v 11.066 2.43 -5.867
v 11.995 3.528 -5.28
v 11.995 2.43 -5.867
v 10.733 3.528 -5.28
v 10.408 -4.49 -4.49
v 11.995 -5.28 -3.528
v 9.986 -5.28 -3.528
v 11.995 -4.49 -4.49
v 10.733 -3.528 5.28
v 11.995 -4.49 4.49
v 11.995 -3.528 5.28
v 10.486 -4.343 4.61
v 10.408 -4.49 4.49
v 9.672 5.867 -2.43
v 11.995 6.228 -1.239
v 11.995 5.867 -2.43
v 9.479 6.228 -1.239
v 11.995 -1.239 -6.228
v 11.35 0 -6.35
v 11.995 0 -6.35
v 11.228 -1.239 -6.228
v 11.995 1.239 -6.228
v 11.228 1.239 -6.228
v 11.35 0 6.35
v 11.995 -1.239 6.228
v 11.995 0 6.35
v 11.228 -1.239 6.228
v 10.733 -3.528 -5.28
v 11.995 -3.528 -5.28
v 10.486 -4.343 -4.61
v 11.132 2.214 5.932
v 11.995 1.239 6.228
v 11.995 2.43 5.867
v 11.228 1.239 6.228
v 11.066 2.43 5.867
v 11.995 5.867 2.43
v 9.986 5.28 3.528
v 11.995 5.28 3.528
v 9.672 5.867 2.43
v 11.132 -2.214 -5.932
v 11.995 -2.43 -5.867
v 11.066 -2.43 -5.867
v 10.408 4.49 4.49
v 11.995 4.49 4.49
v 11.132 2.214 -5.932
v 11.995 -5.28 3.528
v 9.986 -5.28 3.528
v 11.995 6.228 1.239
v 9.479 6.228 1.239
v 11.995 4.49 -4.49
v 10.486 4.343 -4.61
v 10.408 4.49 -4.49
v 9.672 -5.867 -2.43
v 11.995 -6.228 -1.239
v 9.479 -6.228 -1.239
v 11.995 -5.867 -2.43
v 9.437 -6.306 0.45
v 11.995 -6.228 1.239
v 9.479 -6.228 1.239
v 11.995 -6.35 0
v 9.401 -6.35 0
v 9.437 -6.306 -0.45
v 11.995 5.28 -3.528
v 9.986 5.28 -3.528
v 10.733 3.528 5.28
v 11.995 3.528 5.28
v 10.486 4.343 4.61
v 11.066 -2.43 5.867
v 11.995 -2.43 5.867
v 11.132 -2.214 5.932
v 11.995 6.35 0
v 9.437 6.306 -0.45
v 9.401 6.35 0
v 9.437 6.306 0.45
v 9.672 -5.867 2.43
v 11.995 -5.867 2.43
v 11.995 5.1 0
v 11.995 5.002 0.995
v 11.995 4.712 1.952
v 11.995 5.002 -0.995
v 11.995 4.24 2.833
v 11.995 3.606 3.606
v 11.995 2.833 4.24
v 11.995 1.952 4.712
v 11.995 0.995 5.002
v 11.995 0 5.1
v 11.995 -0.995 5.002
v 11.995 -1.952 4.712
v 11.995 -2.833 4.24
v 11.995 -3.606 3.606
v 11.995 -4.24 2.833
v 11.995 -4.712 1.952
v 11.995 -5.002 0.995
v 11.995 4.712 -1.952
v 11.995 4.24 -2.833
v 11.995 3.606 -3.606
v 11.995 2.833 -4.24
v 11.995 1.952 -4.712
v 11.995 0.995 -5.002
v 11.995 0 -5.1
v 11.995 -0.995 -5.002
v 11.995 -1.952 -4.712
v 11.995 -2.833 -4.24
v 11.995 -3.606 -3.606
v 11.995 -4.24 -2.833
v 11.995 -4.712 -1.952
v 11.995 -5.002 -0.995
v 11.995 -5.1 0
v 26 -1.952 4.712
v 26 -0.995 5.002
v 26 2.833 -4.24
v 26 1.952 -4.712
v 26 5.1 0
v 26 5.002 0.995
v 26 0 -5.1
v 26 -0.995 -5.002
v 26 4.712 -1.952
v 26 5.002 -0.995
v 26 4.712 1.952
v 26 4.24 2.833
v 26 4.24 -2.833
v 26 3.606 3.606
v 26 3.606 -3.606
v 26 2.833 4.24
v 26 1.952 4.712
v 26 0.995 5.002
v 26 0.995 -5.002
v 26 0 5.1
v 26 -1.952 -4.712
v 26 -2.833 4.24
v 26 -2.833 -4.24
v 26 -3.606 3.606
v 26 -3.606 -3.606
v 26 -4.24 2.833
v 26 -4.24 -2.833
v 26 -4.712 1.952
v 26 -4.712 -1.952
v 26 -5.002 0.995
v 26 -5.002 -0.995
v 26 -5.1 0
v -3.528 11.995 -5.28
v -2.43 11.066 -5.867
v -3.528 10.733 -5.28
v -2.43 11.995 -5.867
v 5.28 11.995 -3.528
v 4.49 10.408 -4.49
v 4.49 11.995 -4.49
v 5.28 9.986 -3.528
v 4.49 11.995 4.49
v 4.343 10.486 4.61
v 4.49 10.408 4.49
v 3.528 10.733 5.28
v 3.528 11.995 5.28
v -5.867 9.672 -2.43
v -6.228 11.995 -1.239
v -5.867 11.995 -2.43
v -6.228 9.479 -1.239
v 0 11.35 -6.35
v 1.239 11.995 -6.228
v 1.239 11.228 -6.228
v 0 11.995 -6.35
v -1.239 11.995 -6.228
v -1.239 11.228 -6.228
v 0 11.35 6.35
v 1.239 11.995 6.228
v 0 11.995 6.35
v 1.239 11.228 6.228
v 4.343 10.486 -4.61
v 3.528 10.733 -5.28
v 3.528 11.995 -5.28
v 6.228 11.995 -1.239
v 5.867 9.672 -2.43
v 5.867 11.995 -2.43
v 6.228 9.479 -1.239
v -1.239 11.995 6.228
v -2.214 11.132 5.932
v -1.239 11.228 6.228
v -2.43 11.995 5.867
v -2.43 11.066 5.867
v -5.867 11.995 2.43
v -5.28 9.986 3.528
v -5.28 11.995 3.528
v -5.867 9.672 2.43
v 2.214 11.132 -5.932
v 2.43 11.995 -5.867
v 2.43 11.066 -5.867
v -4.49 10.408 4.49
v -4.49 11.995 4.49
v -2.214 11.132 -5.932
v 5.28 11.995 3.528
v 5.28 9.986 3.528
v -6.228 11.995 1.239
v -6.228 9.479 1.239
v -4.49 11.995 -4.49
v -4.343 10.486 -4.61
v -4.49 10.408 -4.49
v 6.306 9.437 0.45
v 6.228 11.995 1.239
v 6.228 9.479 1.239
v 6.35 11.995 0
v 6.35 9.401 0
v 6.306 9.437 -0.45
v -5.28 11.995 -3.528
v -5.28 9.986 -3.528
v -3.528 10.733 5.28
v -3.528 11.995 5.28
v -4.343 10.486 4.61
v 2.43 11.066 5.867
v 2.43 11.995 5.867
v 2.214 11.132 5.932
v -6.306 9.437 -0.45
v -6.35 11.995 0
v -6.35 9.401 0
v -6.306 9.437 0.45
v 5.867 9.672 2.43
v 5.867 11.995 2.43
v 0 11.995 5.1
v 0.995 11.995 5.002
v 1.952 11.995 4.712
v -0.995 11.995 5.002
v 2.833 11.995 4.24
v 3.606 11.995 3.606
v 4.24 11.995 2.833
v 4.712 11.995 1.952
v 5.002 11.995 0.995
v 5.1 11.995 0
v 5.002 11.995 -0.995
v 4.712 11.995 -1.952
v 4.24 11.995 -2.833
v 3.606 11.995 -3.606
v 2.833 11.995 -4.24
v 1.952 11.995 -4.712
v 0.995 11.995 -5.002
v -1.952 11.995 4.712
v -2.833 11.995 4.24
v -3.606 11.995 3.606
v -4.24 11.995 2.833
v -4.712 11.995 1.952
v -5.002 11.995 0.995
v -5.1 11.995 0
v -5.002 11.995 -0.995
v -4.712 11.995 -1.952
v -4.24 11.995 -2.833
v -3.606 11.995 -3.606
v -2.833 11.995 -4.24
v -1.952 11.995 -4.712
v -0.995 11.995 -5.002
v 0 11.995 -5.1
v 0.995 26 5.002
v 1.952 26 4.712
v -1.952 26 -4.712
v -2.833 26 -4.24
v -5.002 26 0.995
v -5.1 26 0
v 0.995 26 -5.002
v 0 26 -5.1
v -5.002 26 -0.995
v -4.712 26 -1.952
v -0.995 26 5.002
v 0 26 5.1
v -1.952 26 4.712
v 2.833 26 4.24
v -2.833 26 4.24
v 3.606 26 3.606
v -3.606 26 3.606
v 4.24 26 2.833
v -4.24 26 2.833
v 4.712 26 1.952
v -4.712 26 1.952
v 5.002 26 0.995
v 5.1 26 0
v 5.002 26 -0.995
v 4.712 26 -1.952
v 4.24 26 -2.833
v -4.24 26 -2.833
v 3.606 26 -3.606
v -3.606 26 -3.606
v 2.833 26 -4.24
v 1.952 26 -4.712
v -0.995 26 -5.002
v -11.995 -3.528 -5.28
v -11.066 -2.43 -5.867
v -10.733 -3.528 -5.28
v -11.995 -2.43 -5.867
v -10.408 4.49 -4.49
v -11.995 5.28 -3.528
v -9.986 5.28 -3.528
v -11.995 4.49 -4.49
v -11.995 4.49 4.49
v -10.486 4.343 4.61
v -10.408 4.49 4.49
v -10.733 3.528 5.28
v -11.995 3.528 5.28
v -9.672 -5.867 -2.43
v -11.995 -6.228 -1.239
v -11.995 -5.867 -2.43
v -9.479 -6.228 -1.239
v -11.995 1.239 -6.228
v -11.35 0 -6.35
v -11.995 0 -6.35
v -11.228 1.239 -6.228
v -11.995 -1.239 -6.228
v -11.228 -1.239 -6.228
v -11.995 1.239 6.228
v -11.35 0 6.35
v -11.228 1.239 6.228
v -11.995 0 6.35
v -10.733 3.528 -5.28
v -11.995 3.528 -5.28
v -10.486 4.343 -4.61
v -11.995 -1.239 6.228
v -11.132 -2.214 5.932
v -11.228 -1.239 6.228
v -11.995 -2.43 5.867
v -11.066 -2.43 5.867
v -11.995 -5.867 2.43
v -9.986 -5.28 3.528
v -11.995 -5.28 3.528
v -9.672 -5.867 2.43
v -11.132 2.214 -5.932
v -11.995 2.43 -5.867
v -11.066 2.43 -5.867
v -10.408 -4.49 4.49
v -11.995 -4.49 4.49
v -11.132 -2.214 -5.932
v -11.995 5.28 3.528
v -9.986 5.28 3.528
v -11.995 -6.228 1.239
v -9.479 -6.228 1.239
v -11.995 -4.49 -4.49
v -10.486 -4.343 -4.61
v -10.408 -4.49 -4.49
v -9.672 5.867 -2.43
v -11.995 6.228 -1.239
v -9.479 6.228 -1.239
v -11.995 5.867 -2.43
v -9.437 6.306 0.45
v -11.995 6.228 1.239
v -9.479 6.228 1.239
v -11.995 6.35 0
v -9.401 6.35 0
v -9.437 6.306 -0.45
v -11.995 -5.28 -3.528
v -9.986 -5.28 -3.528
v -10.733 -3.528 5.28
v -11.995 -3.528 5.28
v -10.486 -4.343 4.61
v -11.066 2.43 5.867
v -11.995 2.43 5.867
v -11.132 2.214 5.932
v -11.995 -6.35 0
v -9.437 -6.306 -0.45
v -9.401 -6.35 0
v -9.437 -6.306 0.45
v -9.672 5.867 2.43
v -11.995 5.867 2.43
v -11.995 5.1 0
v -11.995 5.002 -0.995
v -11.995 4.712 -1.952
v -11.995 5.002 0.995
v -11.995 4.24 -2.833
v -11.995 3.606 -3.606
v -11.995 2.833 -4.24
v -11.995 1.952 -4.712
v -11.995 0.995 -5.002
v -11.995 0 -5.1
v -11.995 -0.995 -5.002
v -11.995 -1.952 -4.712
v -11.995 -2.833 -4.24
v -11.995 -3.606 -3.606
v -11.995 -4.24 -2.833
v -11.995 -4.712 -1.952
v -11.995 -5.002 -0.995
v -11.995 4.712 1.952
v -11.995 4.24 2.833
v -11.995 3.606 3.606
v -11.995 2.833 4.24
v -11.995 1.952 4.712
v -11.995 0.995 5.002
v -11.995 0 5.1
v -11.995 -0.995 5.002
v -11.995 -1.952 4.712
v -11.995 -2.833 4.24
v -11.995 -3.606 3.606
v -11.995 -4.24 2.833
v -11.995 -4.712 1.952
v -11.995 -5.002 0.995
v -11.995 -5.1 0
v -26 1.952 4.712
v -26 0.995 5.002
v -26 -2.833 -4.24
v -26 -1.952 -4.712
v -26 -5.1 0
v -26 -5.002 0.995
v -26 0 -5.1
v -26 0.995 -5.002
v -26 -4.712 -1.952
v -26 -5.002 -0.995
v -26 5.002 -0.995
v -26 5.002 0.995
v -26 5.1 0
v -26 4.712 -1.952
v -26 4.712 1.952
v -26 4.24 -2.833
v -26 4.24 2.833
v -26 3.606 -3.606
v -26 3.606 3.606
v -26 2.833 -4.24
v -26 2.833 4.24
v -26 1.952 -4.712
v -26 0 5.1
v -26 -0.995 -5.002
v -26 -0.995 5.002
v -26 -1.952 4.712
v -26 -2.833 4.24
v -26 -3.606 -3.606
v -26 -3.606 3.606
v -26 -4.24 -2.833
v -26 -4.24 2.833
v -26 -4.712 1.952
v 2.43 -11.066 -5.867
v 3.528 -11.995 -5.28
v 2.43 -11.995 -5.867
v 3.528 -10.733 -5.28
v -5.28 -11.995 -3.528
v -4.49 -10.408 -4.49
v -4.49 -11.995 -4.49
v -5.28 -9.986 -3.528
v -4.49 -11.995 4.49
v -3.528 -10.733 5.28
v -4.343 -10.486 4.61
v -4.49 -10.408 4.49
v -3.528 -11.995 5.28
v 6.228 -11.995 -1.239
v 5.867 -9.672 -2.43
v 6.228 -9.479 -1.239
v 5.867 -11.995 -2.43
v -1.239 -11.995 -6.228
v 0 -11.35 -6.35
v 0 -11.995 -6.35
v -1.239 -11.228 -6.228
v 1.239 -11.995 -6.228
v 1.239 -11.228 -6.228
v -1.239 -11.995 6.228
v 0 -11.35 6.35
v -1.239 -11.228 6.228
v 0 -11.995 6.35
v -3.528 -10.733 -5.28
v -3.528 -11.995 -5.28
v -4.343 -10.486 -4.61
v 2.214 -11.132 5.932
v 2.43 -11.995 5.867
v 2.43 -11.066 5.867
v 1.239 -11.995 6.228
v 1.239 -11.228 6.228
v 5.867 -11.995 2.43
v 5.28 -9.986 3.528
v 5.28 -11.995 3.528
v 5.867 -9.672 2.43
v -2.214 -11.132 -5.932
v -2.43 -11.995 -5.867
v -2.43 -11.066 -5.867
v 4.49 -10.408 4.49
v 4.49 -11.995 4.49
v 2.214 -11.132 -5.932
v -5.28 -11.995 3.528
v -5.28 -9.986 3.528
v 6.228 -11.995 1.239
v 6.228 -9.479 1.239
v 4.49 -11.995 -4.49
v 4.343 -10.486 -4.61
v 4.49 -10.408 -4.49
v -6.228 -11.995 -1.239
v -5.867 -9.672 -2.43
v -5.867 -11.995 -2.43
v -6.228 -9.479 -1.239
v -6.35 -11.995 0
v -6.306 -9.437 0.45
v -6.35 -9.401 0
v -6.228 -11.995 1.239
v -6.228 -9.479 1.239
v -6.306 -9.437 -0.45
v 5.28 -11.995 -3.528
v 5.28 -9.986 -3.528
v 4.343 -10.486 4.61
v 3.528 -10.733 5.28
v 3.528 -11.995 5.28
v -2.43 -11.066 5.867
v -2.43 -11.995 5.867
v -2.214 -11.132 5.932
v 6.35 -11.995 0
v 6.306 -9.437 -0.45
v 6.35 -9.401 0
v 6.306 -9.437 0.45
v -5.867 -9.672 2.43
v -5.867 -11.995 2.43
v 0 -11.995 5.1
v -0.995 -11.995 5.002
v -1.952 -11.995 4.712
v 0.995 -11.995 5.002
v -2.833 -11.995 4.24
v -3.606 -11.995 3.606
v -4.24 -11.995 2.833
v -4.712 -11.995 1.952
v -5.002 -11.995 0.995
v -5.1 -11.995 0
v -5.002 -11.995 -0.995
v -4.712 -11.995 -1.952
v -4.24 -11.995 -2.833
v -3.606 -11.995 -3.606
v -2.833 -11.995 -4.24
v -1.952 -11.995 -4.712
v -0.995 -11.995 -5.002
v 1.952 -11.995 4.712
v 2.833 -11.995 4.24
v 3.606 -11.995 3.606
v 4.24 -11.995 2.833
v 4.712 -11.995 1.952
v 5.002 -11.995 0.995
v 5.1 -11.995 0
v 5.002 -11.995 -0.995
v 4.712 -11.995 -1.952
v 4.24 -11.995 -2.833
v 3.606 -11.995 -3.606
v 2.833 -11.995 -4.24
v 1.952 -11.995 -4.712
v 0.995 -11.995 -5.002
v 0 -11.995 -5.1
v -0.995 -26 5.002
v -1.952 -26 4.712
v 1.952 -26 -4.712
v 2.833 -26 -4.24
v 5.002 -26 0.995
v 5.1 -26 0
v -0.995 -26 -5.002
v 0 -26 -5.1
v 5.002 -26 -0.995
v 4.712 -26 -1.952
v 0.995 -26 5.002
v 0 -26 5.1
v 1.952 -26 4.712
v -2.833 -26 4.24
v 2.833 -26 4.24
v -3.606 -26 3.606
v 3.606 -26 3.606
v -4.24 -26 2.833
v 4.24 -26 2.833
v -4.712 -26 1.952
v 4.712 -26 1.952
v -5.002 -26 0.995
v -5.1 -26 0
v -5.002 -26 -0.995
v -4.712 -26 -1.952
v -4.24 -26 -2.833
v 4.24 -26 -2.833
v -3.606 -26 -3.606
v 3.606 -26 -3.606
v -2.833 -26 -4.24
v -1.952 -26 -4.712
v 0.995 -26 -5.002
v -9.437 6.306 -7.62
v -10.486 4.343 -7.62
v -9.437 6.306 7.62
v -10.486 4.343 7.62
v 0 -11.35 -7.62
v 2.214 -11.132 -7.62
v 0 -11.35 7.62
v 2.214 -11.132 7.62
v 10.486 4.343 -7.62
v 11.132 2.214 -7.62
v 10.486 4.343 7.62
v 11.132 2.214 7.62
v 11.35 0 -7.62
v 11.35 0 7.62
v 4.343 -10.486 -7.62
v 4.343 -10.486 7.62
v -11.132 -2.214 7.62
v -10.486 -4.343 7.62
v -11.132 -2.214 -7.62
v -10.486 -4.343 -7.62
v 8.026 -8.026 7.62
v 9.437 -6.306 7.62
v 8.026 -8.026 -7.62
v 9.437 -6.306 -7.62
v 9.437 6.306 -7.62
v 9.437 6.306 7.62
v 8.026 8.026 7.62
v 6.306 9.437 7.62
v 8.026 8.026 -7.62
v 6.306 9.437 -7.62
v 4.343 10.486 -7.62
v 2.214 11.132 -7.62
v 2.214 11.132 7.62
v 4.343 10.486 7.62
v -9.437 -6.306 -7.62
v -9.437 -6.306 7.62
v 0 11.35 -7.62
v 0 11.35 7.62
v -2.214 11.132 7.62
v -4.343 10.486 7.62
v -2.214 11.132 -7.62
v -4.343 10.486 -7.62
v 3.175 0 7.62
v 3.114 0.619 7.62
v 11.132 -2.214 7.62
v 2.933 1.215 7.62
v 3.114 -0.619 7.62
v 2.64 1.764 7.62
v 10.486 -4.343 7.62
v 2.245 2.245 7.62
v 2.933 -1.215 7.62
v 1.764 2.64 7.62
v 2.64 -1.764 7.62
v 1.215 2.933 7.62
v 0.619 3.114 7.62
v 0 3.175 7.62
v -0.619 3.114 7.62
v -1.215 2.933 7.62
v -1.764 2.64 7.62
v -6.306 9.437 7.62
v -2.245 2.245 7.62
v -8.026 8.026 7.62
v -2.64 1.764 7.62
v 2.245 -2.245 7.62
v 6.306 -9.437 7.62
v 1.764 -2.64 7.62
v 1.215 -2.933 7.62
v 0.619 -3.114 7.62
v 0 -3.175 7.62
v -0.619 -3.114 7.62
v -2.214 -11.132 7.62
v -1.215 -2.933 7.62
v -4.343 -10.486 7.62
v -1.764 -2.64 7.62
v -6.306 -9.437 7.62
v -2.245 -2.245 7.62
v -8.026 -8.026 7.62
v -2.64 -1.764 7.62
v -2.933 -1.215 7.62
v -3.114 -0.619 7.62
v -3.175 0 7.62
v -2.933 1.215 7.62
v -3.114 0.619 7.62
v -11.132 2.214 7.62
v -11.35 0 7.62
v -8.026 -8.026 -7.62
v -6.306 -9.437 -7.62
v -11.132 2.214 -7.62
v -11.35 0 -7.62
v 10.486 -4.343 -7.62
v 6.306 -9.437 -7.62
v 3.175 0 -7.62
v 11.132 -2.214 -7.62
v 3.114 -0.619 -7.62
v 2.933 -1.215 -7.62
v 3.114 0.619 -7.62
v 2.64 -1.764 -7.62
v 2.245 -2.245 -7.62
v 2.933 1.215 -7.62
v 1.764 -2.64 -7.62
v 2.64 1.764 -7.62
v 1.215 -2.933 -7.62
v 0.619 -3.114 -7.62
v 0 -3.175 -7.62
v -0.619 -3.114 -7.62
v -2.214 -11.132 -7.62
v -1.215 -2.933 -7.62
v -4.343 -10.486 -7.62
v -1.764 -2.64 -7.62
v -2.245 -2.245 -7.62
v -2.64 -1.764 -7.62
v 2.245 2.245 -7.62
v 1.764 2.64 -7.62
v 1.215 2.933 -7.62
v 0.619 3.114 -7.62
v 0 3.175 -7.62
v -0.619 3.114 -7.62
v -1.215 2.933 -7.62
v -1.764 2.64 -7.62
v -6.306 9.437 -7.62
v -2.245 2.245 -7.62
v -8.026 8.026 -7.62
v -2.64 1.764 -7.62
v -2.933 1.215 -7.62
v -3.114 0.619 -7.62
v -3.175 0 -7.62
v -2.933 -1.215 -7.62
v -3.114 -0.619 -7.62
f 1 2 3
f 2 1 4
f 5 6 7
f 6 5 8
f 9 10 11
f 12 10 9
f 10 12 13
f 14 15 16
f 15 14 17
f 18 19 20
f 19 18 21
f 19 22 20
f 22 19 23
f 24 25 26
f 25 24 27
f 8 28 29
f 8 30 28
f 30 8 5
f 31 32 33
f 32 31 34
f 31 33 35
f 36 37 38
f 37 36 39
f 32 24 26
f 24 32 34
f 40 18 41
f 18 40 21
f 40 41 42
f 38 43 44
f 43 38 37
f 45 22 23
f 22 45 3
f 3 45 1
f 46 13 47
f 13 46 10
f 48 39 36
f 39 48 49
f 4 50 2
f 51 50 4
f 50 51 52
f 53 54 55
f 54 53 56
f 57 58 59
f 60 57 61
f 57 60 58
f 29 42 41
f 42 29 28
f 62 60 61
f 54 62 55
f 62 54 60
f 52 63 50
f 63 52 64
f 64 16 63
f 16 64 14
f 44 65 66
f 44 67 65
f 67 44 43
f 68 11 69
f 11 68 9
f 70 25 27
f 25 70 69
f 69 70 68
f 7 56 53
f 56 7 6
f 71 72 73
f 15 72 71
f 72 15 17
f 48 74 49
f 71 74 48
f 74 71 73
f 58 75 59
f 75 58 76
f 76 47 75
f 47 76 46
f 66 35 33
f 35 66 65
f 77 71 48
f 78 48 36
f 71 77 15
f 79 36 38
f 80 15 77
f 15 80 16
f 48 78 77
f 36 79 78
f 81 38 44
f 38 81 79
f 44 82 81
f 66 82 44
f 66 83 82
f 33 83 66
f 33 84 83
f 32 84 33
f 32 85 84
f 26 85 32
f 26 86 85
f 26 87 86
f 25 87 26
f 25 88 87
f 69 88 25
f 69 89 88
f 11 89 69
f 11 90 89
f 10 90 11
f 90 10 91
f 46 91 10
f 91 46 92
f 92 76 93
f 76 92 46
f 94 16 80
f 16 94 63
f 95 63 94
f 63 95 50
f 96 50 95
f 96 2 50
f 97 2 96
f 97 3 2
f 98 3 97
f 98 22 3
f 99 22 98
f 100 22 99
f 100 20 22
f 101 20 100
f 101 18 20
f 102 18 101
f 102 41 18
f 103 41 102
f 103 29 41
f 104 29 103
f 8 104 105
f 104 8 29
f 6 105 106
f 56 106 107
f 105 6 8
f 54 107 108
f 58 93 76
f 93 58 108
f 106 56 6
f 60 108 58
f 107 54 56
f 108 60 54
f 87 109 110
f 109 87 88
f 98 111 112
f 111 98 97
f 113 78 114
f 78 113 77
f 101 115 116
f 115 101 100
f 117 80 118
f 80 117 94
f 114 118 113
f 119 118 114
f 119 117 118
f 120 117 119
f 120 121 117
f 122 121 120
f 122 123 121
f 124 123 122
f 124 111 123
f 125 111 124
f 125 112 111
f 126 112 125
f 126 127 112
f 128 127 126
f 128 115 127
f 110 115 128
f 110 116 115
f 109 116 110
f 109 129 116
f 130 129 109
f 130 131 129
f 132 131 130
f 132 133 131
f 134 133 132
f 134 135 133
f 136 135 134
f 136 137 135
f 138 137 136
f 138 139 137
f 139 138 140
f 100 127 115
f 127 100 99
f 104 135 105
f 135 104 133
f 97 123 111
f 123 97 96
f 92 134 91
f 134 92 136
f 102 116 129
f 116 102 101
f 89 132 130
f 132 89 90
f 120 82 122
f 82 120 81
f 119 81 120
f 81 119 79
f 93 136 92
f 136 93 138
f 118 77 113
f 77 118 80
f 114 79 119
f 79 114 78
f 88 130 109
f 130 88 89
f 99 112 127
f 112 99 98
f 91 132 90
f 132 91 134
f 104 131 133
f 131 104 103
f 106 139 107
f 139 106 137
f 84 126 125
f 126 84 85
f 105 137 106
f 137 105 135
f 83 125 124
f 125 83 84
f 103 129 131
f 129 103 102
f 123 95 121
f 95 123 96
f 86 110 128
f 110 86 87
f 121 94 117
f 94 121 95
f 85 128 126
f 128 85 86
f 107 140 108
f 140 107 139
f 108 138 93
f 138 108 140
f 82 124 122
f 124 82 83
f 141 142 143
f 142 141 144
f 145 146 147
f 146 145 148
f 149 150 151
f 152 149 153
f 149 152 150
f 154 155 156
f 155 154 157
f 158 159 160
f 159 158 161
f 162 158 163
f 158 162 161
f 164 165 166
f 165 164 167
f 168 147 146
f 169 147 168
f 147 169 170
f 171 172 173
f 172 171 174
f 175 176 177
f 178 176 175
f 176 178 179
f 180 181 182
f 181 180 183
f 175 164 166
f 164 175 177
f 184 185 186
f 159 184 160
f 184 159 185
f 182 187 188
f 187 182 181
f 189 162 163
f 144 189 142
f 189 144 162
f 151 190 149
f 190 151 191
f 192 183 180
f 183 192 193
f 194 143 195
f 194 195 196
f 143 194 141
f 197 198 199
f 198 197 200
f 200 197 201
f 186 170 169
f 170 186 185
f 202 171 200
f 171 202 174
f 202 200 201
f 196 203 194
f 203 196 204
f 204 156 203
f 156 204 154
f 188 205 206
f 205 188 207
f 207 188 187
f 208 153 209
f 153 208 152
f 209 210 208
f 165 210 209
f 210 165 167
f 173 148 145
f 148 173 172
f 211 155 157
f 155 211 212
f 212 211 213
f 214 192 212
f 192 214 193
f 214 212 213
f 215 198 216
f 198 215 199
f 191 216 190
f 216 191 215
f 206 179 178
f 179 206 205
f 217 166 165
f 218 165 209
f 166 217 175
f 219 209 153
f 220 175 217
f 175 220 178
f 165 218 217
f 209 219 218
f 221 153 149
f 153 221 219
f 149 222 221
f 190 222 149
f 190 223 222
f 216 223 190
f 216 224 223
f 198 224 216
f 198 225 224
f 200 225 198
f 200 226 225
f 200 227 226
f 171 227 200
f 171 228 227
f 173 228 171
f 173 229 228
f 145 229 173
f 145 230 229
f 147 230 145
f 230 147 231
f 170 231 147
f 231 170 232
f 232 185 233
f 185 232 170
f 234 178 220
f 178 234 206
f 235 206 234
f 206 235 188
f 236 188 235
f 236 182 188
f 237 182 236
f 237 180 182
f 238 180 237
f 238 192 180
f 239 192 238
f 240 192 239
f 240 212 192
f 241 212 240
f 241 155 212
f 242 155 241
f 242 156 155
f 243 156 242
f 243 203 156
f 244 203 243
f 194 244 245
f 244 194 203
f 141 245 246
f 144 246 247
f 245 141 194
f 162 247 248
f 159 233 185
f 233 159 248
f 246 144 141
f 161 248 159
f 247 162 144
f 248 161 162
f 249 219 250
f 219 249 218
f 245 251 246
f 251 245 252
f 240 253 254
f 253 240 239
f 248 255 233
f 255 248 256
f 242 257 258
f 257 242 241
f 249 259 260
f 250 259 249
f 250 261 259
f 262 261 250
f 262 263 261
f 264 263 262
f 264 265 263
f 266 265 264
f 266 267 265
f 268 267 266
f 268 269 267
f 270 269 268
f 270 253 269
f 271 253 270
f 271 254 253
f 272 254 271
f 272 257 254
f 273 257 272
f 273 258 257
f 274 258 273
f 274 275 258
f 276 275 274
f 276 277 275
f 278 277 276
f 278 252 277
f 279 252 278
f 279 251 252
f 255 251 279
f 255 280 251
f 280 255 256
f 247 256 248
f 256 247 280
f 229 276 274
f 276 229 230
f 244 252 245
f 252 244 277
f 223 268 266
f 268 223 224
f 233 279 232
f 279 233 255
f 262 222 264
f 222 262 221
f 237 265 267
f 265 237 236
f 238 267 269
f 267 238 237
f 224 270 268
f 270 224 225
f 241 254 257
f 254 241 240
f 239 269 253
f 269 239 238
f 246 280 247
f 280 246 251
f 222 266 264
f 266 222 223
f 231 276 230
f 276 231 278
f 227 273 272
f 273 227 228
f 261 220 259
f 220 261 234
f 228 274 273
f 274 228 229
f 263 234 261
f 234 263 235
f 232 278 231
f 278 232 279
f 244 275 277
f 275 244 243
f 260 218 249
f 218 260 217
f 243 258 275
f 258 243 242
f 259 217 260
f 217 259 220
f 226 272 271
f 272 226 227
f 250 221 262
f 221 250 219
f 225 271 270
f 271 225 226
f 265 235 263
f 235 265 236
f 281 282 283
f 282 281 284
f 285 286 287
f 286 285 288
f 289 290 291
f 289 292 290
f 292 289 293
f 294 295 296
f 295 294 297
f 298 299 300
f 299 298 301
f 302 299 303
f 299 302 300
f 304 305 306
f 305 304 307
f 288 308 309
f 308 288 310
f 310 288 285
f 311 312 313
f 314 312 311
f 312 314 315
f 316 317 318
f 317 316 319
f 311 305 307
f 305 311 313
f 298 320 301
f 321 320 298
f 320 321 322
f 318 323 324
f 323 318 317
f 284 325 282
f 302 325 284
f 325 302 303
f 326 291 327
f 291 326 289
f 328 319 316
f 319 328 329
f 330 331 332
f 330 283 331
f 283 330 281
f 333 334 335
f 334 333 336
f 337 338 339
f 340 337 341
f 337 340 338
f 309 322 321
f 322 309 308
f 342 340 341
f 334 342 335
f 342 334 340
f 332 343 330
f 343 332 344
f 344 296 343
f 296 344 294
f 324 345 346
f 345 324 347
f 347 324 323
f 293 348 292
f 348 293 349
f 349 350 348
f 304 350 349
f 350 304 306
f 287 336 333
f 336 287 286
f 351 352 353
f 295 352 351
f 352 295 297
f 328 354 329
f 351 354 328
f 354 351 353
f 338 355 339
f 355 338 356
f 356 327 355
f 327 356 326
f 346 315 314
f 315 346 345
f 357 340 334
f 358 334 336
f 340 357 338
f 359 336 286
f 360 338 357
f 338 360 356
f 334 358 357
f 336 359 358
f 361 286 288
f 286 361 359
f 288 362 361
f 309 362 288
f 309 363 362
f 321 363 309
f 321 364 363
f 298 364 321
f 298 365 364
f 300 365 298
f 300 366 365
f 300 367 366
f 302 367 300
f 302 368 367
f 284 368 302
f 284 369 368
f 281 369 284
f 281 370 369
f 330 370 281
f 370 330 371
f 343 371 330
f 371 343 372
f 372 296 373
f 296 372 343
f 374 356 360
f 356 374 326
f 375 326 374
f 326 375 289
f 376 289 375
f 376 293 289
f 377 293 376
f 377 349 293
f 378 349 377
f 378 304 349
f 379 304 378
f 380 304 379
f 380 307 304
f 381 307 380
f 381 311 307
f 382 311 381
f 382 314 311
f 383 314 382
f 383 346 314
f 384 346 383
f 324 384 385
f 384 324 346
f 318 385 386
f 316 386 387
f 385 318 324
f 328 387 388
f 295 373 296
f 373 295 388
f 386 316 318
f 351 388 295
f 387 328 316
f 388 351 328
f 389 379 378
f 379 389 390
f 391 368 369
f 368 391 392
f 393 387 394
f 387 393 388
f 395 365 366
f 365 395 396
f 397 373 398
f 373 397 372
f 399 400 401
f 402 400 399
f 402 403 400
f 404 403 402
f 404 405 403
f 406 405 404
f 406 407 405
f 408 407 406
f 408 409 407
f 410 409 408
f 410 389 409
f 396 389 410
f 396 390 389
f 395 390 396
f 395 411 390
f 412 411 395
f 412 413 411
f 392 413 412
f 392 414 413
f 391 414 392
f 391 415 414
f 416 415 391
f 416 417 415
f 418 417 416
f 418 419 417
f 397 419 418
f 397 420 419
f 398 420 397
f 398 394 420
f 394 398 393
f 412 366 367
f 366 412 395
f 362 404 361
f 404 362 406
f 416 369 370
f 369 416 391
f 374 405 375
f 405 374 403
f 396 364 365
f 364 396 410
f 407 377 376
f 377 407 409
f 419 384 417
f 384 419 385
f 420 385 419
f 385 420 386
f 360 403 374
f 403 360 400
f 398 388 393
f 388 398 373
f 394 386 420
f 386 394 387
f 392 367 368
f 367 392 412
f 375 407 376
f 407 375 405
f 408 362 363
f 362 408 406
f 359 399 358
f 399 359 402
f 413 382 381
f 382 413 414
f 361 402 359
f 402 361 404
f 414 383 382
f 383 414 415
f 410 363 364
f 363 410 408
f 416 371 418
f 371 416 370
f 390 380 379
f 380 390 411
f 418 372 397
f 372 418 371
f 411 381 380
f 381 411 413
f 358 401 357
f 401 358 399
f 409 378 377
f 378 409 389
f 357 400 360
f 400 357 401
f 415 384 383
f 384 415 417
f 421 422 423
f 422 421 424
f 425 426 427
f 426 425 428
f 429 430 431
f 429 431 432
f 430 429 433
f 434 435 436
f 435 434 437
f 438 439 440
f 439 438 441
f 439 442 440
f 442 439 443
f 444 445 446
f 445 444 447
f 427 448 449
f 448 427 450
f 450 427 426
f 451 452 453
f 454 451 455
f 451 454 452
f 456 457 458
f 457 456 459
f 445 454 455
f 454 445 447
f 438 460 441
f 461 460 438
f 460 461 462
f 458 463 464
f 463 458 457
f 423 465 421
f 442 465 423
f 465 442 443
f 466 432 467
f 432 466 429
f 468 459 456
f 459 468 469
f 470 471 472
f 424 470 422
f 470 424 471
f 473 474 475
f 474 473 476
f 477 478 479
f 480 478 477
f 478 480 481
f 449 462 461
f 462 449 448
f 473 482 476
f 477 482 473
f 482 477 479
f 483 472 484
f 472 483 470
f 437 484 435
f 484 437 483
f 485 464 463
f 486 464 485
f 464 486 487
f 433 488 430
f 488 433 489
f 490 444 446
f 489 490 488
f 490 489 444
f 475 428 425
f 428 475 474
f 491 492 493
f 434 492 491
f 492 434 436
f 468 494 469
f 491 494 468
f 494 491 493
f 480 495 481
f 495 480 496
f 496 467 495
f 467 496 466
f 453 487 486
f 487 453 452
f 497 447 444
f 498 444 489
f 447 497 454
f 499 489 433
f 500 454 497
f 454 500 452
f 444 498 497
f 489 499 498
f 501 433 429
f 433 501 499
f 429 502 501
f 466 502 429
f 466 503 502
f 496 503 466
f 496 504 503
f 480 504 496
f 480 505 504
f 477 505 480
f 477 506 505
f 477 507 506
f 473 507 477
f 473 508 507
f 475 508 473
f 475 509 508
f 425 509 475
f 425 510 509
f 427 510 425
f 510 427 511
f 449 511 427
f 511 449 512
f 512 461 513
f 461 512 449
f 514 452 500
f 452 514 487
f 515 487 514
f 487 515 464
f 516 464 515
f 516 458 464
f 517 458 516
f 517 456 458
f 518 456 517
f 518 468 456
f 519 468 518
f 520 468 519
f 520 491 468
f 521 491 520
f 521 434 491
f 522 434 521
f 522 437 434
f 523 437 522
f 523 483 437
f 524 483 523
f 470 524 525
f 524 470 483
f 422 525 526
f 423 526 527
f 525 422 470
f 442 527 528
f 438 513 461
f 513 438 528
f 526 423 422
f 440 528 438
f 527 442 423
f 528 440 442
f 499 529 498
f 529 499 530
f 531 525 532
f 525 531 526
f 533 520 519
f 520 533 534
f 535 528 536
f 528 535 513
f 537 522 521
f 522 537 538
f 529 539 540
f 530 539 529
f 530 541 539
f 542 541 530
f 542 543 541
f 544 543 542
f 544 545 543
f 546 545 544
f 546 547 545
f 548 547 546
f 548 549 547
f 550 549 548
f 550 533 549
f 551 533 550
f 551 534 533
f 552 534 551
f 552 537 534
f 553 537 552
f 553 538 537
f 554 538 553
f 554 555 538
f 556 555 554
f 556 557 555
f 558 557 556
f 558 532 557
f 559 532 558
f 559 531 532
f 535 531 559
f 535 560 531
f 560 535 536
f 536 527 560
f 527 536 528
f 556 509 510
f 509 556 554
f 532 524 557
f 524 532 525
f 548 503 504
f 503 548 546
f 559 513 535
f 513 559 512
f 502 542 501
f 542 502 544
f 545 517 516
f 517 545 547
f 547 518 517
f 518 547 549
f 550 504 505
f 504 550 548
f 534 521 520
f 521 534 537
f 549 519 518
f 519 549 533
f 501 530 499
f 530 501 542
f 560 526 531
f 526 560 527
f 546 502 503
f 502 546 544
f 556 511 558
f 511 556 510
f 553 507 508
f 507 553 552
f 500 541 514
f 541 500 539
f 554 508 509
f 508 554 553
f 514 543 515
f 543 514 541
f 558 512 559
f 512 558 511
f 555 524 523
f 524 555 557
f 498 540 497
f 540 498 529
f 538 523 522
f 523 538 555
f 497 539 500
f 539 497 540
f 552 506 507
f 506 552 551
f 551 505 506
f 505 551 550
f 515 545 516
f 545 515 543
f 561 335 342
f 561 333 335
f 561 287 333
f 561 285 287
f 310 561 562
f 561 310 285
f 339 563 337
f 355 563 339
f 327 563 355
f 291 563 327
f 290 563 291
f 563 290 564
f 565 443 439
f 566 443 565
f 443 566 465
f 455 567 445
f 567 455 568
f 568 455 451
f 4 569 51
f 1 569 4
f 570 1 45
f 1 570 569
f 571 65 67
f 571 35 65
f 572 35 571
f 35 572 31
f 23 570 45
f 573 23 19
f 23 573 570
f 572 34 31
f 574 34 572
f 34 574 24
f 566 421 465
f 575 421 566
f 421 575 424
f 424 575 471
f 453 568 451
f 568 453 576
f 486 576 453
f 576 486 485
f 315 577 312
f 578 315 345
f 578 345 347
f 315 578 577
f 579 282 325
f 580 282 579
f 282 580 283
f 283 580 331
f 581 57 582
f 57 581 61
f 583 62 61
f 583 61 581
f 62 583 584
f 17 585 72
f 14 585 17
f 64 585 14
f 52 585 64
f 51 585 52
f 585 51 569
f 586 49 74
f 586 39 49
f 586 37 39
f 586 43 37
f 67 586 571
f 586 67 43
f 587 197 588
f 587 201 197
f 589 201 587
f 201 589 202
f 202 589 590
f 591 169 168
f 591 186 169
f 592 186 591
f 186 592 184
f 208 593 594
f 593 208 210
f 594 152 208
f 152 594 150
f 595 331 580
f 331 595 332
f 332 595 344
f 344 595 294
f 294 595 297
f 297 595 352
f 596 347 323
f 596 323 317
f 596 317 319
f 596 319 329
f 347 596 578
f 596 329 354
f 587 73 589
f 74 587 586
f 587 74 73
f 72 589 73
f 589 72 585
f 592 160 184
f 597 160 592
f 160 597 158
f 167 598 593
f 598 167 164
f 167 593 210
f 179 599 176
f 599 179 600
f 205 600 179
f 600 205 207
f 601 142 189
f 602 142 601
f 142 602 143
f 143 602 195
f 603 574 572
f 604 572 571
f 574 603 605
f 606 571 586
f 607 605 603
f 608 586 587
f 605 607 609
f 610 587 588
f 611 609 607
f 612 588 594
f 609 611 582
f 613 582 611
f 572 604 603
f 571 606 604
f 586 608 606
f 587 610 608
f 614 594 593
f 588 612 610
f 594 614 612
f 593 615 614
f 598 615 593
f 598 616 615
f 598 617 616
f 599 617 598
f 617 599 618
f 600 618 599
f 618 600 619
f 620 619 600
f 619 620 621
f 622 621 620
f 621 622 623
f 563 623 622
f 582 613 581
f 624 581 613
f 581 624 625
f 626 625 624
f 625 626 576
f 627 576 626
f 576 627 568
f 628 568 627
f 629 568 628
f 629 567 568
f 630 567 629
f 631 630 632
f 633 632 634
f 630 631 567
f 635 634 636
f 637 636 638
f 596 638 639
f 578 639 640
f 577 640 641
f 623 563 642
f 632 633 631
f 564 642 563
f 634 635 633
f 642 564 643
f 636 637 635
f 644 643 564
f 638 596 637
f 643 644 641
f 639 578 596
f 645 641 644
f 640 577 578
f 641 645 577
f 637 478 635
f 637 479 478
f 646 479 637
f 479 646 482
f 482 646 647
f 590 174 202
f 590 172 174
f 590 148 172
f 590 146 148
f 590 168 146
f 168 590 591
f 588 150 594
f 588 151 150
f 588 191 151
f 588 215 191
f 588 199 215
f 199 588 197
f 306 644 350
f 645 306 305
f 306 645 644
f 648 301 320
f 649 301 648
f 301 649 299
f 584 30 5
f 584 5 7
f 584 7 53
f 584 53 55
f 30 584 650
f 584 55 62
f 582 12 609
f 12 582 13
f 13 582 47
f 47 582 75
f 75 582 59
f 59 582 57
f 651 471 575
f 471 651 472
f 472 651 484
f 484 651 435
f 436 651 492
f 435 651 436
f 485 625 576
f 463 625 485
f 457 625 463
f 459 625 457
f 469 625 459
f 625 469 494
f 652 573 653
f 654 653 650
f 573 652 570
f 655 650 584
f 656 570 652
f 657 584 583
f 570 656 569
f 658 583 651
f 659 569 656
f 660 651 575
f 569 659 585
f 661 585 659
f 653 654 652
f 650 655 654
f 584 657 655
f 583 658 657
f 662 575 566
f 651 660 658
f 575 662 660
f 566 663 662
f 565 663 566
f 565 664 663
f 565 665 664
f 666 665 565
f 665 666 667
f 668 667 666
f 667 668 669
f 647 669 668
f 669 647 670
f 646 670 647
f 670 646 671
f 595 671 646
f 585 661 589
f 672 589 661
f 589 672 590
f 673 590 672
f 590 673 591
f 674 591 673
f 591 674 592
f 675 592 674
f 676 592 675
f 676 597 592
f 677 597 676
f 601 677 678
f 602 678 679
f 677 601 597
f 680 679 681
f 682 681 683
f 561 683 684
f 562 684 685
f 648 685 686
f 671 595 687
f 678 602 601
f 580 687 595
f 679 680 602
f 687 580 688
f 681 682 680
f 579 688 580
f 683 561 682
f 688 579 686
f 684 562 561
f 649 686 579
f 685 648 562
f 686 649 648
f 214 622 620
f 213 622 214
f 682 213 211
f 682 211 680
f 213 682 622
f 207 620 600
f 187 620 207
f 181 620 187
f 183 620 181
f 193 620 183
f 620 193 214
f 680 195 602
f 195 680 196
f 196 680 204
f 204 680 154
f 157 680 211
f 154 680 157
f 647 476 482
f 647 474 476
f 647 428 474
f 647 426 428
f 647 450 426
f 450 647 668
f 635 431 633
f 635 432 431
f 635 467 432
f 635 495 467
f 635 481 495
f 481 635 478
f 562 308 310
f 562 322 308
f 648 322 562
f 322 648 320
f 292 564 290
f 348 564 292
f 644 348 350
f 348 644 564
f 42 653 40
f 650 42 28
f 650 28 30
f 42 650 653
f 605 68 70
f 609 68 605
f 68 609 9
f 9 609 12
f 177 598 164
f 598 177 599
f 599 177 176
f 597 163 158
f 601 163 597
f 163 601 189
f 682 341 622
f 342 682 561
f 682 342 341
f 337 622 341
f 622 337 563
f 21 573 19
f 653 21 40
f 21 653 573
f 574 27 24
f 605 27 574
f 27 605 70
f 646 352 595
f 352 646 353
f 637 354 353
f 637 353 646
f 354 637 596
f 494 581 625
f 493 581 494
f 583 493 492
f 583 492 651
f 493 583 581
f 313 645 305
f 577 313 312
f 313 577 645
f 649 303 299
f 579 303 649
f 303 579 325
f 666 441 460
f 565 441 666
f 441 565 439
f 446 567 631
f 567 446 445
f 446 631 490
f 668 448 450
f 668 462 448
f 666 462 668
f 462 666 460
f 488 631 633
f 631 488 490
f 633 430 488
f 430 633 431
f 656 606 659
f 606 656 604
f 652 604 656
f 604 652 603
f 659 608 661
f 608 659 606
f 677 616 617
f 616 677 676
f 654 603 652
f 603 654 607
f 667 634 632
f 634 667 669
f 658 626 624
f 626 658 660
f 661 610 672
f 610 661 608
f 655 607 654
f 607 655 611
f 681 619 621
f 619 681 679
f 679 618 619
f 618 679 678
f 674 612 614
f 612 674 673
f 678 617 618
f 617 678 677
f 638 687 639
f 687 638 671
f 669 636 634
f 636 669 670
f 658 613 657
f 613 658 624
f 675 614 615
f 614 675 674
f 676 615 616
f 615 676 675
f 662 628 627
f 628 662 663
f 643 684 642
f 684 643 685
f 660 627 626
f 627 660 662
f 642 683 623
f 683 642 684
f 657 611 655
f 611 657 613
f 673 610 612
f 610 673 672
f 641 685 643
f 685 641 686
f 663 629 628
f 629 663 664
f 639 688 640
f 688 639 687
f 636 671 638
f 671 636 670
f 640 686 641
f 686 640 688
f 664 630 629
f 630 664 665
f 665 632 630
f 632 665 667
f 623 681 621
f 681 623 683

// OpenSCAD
$fn = 32;

// ----------------------------------------------------------------------
// Cardan cross: 52 mm span, 12.7 mm trunnions
// ----------------------------------------------------------------------

// --- parameters (mm) ---
journal_d = 12.7;         // trunnion diameter
arm_len = 26;             // trunnion length from the centre
step_r = 4.32;            // step position from the centre
step_d = 10.2;            // journal diameter after the step
hub_d = 22.7;             // hub diameter
hub_h = 15.24;            // hub height
bore_d = 6.35;            // hub bore

difference() {
  union() {
    /* hub along the joint axis */
    cylinder(h = hub_h, d = hub_d, center = true);
    for (a = [0 : 90 : 270]) rotate([0, 0, a]) {
      /* trunnion, sunk into the hub */
      translate([hub_d / 4, 0, 0]) rotate([0, 90, 0]) cylinder(h = step_r + 2, d = journal_d);
      /* stepped journal out to the tip */
      translate([step_r - 0.5, 0, 0]) rotate([0, 90, 0]) cylinder(h = arm_len + 0.5 - step_r, d = step_d);
    }
  }
  /* lubrication bore through the hub, 2.5 mm clear on both sides */
  translate([0, 0, -hub_h / 2 - 2.5]) cylinder(h = hub_h + 5, d = bore_d);
}
